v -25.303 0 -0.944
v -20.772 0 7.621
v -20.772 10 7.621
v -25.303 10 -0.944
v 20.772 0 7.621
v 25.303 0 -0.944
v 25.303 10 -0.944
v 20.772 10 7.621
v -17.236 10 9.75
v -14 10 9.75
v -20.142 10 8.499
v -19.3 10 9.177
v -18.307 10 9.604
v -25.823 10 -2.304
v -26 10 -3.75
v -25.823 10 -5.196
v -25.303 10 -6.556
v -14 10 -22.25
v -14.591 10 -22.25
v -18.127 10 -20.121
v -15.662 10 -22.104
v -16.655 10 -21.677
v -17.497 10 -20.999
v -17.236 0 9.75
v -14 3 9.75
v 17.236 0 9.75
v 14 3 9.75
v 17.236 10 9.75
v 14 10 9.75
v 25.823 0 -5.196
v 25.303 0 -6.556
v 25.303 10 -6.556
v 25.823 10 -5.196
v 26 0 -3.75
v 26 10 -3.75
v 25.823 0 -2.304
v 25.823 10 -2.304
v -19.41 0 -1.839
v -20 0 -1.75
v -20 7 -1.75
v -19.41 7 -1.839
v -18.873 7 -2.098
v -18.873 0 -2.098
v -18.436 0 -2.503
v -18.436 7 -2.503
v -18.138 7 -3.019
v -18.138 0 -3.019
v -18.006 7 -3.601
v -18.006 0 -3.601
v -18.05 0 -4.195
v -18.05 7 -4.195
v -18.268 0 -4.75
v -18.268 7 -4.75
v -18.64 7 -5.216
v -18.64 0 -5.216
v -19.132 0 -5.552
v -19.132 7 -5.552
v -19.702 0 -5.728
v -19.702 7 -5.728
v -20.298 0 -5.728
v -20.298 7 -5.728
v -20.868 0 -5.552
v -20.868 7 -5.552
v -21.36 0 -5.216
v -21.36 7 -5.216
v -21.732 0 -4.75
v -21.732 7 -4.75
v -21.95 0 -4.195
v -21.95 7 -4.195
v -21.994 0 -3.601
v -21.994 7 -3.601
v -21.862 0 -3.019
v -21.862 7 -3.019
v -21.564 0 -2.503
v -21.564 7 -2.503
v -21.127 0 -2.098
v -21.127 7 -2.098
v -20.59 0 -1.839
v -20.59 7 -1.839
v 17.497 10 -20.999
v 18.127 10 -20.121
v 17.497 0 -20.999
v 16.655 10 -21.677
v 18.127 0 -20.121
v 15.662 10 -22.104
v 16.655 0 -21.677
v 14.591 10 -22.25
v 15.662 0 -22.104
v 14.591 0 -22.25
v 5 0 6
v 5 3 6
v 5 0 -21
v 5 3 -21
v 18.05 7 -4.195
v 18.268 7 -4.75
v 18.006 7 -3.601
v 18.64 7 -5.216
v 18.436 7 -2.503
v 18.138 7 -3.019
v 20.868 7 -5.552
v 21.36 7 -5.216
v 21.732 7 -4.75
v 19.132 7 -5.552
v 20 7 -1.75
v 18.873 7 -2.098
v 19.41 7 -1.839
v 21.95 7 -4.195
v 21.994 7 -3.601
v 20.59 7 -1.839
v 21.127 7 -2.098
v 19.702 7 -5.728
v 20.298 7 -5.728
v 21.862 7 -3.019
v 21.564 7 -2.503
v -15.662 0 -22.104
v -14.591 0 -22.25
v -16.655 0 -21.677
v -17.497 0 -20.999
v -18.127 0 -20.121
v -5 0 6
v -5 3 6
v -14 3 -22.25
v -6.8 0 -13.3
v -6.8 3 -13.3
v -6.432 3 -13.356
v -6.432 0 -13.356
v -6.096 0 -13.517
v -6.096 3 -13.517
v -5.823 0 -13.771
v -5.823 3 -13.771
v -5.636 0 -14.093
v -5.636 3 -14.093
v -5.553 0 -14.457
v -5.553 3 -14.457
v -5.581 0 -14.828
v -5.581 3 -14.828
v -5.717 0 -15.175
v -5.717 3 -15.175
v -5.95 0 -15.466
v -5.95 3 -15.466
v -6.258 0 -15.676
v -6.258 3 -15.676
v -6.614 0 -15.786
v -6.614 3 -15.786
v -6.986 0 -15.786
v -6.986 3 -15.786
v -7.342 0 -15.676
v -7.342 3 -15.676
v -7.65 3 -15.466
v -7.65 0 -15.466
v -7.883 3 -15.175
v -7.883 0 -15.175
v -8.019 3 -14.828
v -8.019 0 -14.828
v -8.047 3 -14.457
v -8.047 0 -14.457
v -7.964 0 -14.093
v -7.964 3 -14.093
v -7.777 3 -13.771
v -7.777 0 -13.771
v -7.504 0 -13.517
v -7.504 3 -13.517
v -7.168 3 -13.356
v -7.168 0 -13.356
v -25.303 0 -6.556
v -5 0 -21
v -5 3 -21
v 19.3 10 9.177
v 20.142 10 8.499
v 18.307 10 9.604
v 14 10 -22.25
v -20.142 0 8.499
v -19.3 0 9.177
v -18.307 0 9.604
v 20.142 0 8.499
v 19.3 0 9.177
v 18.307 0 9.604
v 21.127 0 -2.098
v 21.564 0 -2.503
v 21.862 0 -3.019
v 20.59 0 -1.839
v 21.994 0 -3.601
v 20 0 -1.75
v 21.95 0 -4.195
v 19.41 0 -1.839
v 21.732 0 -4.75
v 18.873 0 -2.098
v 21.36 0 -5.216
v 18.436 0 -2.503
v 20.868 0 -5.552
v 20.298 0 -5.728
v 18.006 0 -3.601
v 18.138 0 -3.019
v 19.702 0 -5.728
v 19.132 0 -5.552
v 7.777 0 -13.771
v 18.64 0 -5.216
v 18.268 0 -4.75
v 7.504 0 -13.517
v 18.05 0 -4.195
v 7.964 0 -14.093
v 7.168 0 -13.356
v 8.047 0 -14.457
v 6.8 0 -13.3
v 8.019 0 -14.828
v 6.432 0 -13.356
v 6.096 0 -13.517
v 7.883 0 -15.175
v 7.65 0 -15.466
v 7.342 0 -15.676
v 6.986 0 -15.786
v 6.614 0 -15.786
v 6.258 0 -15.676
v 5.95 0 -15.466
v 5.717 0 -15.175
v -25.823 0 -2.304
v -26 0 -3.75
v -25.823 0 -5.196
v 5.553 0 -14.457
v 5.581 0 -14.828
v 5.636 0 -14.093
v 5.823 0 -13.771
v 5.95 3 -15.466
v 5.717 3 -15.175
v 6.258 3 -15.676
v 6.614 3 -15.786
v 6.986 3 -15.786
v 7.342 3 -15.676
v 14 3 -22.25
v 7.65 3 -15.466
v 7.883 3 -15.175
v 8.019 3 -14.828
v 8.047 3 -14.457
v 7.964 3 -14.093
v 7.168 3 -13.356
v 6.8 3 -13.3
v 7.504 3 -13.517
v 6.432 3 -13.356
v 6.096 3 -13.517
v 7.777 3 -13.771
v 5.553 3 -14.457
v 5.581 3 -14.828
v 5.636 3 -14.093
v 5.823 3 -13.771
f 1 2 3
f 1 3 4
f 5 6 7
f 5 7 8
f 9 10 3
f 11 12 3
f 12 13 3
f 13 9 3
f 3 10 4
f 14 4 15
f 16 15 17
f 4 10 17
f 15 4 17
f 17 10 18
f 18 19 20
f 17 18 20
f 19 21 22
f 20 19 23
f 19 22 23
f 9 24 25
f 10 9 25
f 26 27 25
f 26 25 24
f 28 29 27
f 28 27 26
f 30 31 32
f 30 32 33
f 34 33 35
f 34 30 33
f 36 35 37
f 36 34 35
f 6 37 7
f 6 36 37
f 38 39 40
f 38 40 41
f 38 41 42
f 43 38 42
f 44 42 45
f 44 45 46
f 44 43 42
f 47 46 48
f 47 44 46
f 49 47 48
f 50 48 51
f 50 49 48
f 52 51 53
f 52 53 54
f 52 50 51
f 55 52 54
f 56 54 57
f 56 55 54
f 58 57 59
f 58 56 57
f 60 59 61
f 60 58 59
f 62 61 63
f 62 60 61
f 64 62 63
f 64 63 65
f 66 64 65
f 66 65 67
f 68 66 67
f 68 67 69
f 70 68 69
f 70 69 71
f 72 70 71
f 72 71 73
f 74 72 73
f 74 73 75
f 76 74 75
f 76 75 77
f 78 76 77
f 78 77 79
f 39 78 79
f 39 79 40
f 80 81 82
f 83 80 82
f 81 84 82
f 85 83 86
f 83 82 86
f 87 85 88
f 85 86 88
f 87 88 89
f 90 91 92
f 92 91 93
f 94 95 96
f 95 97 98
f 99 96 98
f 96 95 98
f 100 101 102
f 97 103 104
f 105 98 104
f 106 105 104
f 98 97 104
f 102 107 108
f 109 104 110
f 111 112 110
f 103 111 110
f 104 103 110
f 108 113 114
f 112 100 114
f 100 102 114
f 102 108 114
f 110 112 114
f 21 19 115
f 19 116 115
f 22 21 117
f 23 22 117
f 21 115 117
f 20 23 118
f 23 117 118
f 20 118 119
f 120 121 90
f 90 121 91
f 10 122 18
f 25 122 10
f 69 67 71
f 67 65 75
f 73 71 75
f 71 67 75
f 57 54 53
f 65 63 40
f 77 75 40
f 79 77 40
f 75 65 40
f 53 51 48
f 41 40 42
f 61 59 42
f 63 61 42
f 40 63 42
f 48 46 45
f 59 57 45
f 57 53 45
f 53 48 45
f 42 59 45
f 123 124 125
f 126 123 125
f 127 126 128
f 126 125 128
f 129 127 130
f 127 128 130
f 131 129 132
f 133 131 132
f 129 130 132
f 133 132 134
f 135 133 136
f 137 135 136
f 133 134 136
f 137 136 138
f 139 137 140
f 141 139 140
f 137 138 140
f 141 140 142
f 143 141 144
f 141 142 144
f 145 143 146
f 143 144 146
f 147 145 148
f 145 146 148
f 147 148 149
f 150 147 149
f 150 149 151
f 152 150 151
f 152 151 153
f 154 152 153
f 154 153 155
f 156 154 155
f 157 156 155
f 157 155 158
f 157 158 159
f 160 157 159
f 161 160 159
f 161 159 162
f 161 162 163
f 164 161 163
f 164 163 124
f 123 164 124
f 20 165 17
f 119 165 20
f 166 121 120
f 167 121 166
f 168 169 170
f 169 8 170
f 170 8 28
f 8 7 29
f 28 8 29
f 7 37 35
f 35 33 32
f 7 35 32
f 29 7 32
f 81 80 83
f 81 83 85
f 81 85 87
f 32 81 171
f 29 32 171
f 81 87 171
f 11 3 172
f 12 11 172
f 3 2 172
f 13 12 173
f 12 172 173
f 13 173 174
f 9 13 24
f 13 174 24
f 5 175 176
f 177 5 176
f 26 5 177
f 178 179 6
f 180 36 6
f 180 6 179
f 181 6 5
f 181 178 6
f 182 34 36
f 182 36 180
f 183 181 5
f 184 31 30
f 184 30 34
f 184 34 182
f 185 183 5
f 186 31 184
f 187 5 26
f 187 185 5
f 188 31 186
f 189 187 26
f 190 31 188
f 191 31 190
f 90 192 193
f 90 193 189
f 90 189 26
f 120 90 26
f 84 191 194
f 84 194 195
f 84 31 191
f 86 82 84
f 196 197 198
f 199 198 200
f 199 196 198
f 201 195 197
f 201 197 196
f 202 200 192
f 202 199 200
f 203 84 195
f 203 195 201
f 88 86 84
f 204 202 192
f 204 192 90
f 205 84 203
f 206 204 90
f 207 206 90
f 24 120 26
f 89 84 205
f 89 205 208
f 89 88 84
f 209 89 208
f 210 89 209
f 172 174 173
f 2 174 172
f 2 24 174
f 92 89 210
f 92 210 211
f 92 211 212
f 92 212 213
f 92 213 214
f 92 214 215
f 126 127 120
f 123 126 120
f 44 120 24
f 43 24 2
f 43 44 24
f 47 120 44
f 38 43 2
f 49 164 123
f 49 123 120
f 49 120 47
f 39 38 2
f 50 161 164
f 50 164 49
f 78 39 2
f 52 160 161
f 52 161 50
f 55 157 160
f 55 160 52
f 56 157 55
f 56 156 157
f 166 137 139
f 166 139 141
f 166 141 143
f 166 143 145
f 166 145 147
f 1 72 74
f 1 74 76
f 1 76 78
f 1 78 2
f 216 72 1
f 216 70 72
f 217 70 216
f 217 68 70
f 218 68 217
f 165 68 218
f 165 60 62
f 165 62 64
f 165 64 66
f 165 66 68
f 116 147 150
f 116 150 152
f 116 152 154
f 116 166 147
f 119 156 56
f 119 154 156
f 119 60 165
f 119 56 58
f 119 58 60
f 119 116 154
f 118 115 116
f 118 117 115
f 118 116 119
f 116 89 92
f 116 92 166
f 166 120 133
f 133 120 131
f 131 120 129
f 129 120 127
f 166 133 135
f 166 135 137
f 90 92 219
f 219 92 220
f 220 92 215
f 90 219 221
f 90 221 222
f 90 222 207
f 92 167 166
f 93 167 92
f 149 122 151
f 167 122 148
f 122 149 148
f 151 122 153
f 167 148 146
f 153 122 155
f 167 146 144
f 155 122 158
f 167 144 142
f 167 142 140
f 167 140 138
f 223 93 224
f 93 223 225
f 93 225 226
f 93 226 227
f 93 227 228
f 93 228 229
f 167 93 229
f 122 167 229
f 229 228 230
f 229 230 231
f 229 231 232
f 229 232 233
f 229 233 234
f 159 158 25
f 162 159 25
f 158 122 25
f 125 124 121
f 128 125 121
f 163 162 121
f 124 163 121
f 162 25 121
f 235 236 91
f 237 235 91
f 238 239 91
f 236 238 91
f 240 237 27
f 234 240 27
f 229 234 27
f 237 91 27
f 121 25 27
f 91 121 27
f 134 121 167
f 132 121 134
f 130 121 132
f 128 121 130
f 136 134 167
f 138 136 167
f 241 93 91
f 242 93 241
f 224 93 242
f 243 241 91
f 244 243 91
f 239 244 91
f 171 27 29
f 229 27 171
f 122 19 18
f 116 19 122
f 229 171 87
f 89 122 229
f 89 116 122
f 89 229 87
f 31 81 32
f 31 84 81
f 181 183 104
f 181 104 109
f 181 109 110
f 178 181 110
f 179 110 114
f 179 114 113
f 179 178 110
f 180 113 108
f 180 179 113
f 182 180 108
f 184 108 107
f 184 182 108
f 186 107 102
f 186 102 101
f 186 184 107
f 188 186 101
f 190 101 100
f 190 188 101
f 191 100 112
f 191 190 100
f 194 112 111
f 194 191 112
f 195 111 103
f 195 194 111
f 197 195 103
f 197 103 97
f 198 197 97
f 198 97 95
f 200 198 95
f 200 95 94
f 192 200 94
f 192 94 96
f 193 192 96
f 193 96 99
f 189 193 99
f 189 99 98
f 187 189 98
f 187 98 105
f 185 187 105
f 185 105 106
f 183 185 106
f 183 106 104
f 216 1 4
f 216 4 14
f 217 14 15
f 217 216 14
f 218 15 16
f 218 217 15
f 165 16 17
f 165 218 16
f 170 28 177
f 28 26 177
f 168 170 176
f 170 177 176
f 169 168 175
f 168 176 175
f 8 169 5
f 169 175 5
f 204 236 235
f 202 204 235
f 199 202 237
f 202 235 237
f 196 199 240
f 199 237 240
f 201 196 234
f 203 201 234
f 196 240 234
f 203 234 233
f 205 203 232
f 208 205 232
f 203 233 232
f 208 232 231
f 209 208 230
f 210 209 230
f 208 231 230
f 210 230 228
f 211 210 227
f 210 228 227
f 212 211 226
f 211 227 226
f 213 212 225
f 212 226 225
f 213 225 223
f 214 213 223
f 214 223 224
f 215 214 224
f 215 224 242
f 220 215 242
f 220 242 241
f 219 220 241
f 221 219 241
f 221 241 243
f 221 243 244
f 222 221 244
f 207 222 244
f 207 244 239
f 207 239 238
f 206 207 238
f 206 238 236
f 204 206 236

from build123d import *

# Parameters (mm, degrees)
BOSS_EXTRUDE3_DEPTH     = 3
SKETCH14_W              = 3
SKETCH14_H              = 37
BOSS_EXTRUDE8_DEPTH     = 3
SKETCH15_R              = 2
BOSS_EXTRUDE9_DEPTH     = 10
BOSS_EXTRUDE10_START    = -3
SKETCH16_R              = 2
BOSS_EXTRUDE10_DEPTH    = 3
CUT_EXTRUDE6_DEPTH      = 36.65196348
CUT_EXTRUDE6_DEPTH_BACK = 36.65196348
SKETCH18_W              = 39.290830544
SKETCH18_H              = 5
FILLET1_R               = 4
SKETCH19_R              = 1.25
SKETCH19_W              = 10
SKETCH19_H              = 27
CUT_EXTRUDE7_DEPTH      = 10


with BuildPart() as part:
    # Sketch1 → Boss-Extrude3 (new body)
    with BuildSketch(Plane(origin=(0, 0, 0), x_dir=(1, 0, 0), z_dir=(0, 1, 0))):
        Polygon((-14, -6.25), (-14, 13.75), (-14, 22.25), (14, 22.25), (14, 13.75), (14, -6.25), (14, -14.75), (-14, -14.75), align=None)
    extrude(amount=BOSS_EXTRUDE3_DEPTH)

    # Sketch14 → Boss-Extrude8 (add)
    with BuildSketch(Plane.XZ):
        with Locations((-15.5, -3.75)):
            Rectangle(SKETCH14_W, SKETCH14_H)
        with Locations((15.5, -3.75)):
            Rectangle(SKETCH14_W, SKETCH14_H)
    extrude(amount=-BOSS_EXTRUDE8_DEPTH)

    # Sketch15 → Boss-Extrude9 (add)
    # profile 1 of 2: a face of its own
    with BuildSketch(Plane(origin=(0, 0, 0), x_dir=(1, 0, 0), z_dir=(0, 1, 0))):
        with BuildLine():
            Line((-25.3034482, 6.555964573), (-17, 22.25))
            Line((-17, 22.25), (-14, 22.25))
            Line((-14, 22.25), (-14, -14.75))
            Line((-14, -14.75), (-17, -14.75))
            Line((-17, -14.75), (-25.3034482, 0.944035427))
            ThreePointArc((-25.3034482, 0.944035427), (-26, 3.75), (-25.3034482, 6.555964573))
        make_face()
        with Locations(Location((-20, 3.75, 0), (0, 0, 270))):
            Circle(SKETCH15_R, mode=Mode.SUBTRACT)
    # profile 2 of 2: a face of its own
    with BuildSketch(Plane(origin=(0, 0, 0), x_dir=(1, 0, 0), z_dir=(0, 1, 0))):
        with BuildLine():
            Line((17, 22.25), (25.3034482, 6.555964573))
            ThreePointArc((25.3034482, 6.555964573), (26, 3.75), (25.3034482, 0.944035427))
            Line((25.3034482, 0.944035427), (17, -14.75))
            Line((17, -14.75), (14, -14.75))
            Line((14, -14.75), (14, 22.25))
            Line((14, 22.25), (17, 22.25))
        make_face()
        with Locations(Location((20, 3.75, 0), (0, 0, 270))):
            Circle(SKETCH15_R, mode=Mode.SUBTRACT)
    extrude(amount=BOSS_EXTRUDE9_DEPTH)

    # Sketch16 → Boss-Extrude10 (add)
    with BuildSketch(Plane(origin=(0, 10, 0), x_dir=(1, 0, 0), z_dir=(0, 1, 0)).offset(BOSS_EXTRUDE10_START)):
        with Locations(Location((20, 3.75, 0), (0, 0, 270))):
            Circle(SKETCH16_R)
        with Locations(Location((-20, 3.75, 0), (0, 0, 270))):
            Circle(SKETCH16_R)
    extrude(amount=BOSS_EXTRUDE10_DEPTH)

    # Sketch18 → Cut-Extrude6 (cut, two sides: drawn at the far end of the back side and taken through both)
    with BuildSketch(Plane.XZ.offset(-CUT_EXTRUDE6_DEPTH_BACK)):
        with Locations((0, 12.25)):
            Rectangle(SKETCH18_W, SKETCH18_H)
    extrude(amount=CUT_EXTRUDE6_DEPTH + CUT_EXTRUDE6_DEPTH_BACK, mode=Mode.SUBTRACT)

    # Fillet1
    fillet1_edges = [part.edges().sort_by_distance(p)[0] for p in [
        (19.645415272, 5, 9.75),
        (-19.645415272, 5, 9.75),
        (-17, 5, -22.25),
        (17, 5, -22.25),
    ]]
    fillet(fillet1_edges, radius=FILLET1_R)

    # Sketch19 → Cut-Extrude7 (cut)
    with BuildSketch(Plane(origin=(0, 3, 0), x_dir=(1, 0, 0), z_dir=(0, 1, 0))):
        with Locations(Location((-6.8, 14.55, 0), (0, 0, 270))):
            Circle(SKETCH19_R)
        with Locations(Location((6.8, 14.55, 0), (0, 0, 270))):
            Circle(SKETCH19_R)
        with Locations((0, 7.5)):
            Rectangle(SKETCH19_W, SKETCH19_H)
    extrude(amount=-CUT_EXTRUDE7_DEPTH, mode=Mode.SUBTRACT)


solid = part.part
